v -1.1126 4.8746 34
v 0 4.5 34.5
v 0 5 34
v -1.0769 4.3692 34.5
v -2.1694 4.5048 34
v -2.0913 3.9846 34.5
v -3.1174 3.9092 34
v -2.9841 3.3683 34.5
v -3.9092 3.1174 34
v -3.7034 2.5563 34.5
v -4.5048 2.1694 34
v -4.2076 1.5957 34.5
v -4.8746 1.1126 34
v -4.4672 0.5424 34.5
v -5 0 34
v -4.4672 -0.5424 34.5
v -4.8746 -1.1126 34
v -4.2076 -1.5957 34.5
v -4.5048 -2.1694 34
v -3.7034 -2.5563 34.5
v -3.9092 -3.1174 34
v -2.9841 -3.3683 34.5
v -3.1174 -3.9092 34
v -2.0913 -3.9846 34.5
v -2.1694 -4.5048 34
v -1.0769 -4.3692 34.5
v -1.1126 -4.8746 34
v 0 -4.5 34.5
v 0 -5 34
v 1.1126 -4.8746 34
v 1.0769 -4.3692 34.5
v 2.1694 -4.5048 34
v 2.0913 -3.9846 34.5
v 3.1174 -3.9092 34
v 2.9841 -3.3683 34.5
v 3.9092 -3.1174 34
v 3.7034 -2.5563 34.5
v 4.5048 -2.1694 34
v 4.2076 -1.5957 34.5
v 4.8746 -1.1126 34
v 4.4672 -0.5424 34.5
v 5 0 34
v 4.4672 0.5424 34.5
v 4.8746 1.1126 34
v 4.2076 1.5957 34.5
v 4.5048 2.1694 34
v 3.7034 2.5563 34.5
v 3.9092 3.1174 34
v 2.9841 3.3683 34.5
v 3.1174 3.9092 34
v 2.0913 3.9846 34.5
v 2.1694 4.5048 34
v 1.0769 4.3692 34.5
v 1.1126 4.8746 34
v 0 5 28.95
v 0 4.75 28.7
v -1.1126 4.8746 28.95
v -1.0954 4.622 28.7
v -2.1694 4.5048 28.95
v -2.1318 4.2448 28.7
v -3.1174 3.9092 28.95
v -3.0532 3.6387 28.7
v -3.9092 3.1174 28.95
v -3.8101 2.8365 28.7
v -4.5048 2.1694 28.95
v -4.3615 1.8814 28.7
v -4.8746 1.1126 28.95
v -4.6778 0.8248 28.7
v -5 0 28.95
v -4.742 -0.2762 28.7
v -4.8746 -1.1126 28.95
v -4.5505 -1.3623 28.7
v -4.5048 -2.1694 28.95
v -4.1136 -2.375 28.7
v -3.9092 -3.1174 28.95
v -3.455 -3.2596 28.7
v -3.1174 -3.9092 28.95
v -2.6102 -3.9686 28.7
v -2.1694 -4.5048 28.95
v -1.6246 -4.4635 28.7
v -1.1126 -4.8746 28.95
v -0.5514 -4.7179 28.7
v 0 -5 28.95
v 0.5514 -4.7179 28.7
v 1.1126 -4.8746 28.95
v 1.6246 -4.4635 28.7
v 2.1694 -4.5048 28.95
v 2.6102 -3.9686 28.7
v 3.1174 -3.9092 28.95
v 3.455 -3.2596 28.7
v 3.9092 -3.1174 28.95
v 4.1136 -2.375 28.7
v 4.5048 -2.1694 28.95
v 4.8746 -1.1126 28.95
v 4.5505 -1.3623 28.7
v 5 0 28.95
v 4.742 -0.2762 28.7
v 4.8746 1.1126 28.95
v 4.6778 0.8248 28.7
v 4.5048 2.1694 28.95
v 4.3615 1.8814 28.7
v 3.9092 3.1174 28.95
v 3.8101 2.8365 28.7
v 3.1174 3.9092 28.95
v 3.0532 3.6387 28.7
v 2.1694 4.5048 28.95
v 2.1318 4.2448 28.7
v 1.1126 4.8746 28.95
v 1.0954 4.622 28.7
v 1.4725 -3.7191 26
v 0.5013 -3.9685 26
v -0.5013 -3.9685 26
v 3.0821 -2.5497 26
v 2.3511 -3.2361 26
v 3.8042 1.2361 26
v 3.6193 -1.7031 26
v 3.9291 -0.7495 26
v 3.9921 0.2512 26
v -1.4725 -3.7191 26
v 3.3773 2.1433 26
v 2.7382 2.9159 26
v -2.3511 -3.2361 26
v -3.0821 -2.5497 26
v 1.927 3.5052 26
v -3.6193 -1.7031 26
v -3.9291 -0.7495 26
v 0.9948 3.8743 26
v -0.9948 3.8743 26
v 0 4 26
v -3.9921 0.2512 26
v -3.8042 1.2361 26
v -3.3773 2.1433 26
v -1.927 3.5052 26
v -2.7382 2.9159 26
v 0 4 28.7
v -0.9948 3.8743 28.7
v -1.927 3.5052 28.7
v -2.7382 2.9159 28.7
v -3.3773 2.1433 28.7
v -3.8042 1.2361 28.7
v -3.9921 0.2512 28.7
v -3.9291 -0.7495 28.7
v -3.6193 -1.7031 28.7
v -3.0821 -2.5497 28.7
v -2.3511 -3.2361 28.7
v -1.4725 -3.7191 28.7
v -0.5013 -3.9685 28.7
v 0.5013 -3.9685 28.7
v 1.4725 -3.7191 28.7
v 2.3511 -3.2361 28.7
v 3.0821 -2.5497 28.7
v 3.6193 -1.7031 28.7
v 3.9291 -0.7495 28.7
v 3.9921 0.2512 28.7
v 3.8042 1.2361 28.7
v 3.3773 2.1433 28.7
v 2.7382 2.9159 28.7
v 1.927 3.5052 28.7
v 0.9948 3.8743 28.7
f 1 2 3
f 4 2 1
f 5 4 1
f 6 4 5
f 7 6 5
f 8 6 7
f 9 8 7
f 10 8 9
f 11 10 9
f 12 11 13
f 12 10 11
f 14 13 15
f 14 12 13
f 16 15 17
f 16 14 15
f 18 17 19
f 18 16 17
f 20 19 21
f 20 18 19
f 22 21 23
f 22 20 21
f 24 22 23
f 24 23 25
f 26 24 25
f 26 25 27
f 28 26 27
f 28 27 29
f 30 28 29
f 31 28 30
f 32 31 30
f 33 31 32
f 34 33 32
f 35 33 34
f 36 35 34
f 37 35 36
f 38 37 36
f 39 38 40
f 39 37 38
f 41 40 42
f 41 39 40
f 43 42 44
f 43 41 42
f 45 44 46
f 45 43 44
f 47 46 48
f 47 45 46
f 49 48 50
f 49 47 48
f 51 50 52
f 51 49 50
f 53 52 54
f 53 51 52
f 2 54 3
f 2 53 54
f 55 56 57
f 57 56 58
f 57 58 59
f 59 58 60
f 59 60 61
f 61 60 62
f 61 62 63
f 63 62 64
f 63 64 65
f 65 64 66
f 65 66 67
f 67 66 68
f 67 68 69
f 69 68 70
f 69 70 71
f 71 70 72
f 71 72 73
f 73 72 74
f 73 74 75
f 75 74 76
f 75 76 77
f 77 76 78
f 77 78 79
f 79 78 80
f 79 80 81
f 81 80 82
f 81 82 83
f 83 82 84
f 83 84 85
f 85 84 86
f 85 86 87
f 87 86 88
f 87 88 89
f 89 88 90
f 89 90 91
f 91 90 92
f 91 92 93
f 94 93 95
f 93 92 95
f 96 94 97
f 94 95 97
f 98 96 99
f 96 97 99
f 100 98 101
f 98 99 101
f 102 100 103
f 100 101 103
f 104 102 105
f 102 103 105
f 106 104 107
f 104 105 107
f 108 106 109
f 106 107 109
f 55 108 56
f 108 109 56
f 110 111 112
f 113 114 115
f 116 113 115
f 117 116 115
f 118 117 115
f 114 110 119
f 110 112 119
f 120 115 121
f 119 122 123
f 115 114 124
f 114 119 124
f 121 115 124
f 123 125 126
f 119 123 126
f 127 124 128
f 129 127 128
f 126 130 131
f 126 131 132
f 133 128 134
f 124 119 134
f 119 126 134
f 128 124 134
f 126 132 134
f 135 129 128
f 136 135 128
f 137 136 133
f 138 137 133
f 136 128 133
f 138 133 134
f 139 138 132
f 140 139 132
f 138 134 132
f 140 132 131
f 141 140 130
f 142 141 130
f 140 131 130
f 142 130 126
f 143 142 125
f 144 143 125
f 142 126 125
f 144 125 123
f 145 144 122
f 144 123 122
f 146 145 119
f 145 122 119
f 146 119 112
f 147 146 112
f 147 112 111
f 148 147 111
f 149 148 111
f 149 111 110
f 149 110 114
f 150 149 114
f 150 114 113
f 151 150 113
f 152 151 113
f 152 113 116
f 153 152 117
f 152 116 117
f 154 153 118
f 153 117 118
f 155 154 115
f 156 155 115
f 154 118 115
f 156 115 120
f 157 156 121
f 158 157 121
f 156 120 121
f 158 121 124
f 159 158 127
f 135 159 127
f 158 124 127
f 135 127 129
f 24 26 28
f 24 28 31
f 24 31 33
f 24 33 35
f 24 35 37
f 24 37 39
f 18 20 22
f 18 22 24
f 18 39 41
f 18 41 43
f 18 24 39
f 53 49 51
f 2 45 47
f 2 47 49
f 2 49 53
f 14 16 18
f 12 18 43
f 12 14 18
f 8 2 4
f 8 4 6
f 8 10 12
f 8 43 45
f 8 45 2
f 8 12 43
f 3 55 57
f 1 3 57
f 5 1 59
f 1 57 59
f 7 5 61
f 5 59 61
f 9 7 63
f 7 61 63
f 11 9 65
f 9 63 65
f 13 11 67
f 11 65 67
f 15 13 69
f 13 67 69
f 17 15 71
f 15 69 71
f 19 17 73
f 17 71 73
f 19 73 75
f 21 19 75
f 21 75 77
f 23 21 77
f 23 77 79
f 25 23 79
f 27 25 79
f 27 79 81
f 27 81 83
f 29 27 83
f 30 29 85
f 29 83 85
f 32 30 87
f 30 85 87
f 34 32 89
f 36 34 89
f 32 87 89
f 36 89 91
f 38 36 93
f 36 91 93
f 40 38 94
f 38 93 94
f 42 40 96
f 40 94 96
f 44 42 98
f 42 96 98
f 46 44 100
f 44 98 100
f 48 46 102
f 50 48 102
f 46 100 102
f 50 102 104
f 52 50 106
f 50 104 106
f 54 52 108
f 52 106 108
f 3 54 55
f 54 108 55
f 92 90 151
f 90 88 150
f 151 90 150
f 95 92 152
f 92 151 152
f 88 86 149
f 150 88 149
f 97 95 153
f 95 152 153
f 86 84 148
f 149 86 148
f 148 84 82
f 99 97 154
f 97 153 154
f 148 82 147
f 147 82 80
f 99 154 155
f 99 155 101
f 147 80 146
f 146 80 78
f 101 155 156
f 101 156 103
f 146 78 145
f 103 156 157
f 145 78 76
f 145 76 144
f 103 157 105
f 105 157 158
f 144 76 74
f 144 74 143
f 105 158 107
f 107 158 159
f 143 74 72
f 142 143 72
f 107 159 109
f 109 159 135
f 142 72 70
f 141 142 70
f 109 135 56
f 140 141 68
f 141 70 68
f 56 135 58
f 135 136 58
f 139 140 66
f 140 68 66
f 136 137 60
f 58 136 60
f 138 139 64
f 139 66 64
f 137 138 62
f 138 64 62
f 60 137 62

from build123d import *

# Parameters (mm, degrees)
SKETCH004_R     = 4
PAD003_DEPTH    = 2.7
SKETCH005_R     = 5
PAD004_DEPTH    = 5.8
CHAMFER_SIZE    = 0.5
CHAMFER002_SIZE = 0.25


with BuildPart() as part:
    # Sketch004 (on Face1 of CopySubtractivePipe) → Pad003 (new body)
    with BuildSketch(Plane(origin=(0, 0, 26), x_dir=(0, 1, 0), z_dir=(0, 0, 1))):
        Circle(SKETCH004_R)
    extrude(amount=PAD003_DEPTH)

    # Sketch005 (on Face3 of Pad003) → Pad004 (join)
    with BuildSketch(Plane(origin=(0, 0, 28.7), x_dir=(0, 1, 0), z_dir=(0, 0, 1))):
        Circle(SKETCH005_R)
    extrude(amount=PAD004_DEPTH)

    # Chamfer
    chamfer_edges = [part.edges().sort_by_distance(p)[0] for p in [
        (0, -5, 34.5),
    ]]
    chamfer(chamfer_edges, length=CHAMFER_SIZE)

    # Chamfer002
    chamfer002_edges = [part.edges().sort_by_distance(p)[0] for p in [
        (0, -5, 28.7),
    ]]
    chamfer(chamfer002_edges, length=CHAMFER002_SIZE)


solid = part.part
